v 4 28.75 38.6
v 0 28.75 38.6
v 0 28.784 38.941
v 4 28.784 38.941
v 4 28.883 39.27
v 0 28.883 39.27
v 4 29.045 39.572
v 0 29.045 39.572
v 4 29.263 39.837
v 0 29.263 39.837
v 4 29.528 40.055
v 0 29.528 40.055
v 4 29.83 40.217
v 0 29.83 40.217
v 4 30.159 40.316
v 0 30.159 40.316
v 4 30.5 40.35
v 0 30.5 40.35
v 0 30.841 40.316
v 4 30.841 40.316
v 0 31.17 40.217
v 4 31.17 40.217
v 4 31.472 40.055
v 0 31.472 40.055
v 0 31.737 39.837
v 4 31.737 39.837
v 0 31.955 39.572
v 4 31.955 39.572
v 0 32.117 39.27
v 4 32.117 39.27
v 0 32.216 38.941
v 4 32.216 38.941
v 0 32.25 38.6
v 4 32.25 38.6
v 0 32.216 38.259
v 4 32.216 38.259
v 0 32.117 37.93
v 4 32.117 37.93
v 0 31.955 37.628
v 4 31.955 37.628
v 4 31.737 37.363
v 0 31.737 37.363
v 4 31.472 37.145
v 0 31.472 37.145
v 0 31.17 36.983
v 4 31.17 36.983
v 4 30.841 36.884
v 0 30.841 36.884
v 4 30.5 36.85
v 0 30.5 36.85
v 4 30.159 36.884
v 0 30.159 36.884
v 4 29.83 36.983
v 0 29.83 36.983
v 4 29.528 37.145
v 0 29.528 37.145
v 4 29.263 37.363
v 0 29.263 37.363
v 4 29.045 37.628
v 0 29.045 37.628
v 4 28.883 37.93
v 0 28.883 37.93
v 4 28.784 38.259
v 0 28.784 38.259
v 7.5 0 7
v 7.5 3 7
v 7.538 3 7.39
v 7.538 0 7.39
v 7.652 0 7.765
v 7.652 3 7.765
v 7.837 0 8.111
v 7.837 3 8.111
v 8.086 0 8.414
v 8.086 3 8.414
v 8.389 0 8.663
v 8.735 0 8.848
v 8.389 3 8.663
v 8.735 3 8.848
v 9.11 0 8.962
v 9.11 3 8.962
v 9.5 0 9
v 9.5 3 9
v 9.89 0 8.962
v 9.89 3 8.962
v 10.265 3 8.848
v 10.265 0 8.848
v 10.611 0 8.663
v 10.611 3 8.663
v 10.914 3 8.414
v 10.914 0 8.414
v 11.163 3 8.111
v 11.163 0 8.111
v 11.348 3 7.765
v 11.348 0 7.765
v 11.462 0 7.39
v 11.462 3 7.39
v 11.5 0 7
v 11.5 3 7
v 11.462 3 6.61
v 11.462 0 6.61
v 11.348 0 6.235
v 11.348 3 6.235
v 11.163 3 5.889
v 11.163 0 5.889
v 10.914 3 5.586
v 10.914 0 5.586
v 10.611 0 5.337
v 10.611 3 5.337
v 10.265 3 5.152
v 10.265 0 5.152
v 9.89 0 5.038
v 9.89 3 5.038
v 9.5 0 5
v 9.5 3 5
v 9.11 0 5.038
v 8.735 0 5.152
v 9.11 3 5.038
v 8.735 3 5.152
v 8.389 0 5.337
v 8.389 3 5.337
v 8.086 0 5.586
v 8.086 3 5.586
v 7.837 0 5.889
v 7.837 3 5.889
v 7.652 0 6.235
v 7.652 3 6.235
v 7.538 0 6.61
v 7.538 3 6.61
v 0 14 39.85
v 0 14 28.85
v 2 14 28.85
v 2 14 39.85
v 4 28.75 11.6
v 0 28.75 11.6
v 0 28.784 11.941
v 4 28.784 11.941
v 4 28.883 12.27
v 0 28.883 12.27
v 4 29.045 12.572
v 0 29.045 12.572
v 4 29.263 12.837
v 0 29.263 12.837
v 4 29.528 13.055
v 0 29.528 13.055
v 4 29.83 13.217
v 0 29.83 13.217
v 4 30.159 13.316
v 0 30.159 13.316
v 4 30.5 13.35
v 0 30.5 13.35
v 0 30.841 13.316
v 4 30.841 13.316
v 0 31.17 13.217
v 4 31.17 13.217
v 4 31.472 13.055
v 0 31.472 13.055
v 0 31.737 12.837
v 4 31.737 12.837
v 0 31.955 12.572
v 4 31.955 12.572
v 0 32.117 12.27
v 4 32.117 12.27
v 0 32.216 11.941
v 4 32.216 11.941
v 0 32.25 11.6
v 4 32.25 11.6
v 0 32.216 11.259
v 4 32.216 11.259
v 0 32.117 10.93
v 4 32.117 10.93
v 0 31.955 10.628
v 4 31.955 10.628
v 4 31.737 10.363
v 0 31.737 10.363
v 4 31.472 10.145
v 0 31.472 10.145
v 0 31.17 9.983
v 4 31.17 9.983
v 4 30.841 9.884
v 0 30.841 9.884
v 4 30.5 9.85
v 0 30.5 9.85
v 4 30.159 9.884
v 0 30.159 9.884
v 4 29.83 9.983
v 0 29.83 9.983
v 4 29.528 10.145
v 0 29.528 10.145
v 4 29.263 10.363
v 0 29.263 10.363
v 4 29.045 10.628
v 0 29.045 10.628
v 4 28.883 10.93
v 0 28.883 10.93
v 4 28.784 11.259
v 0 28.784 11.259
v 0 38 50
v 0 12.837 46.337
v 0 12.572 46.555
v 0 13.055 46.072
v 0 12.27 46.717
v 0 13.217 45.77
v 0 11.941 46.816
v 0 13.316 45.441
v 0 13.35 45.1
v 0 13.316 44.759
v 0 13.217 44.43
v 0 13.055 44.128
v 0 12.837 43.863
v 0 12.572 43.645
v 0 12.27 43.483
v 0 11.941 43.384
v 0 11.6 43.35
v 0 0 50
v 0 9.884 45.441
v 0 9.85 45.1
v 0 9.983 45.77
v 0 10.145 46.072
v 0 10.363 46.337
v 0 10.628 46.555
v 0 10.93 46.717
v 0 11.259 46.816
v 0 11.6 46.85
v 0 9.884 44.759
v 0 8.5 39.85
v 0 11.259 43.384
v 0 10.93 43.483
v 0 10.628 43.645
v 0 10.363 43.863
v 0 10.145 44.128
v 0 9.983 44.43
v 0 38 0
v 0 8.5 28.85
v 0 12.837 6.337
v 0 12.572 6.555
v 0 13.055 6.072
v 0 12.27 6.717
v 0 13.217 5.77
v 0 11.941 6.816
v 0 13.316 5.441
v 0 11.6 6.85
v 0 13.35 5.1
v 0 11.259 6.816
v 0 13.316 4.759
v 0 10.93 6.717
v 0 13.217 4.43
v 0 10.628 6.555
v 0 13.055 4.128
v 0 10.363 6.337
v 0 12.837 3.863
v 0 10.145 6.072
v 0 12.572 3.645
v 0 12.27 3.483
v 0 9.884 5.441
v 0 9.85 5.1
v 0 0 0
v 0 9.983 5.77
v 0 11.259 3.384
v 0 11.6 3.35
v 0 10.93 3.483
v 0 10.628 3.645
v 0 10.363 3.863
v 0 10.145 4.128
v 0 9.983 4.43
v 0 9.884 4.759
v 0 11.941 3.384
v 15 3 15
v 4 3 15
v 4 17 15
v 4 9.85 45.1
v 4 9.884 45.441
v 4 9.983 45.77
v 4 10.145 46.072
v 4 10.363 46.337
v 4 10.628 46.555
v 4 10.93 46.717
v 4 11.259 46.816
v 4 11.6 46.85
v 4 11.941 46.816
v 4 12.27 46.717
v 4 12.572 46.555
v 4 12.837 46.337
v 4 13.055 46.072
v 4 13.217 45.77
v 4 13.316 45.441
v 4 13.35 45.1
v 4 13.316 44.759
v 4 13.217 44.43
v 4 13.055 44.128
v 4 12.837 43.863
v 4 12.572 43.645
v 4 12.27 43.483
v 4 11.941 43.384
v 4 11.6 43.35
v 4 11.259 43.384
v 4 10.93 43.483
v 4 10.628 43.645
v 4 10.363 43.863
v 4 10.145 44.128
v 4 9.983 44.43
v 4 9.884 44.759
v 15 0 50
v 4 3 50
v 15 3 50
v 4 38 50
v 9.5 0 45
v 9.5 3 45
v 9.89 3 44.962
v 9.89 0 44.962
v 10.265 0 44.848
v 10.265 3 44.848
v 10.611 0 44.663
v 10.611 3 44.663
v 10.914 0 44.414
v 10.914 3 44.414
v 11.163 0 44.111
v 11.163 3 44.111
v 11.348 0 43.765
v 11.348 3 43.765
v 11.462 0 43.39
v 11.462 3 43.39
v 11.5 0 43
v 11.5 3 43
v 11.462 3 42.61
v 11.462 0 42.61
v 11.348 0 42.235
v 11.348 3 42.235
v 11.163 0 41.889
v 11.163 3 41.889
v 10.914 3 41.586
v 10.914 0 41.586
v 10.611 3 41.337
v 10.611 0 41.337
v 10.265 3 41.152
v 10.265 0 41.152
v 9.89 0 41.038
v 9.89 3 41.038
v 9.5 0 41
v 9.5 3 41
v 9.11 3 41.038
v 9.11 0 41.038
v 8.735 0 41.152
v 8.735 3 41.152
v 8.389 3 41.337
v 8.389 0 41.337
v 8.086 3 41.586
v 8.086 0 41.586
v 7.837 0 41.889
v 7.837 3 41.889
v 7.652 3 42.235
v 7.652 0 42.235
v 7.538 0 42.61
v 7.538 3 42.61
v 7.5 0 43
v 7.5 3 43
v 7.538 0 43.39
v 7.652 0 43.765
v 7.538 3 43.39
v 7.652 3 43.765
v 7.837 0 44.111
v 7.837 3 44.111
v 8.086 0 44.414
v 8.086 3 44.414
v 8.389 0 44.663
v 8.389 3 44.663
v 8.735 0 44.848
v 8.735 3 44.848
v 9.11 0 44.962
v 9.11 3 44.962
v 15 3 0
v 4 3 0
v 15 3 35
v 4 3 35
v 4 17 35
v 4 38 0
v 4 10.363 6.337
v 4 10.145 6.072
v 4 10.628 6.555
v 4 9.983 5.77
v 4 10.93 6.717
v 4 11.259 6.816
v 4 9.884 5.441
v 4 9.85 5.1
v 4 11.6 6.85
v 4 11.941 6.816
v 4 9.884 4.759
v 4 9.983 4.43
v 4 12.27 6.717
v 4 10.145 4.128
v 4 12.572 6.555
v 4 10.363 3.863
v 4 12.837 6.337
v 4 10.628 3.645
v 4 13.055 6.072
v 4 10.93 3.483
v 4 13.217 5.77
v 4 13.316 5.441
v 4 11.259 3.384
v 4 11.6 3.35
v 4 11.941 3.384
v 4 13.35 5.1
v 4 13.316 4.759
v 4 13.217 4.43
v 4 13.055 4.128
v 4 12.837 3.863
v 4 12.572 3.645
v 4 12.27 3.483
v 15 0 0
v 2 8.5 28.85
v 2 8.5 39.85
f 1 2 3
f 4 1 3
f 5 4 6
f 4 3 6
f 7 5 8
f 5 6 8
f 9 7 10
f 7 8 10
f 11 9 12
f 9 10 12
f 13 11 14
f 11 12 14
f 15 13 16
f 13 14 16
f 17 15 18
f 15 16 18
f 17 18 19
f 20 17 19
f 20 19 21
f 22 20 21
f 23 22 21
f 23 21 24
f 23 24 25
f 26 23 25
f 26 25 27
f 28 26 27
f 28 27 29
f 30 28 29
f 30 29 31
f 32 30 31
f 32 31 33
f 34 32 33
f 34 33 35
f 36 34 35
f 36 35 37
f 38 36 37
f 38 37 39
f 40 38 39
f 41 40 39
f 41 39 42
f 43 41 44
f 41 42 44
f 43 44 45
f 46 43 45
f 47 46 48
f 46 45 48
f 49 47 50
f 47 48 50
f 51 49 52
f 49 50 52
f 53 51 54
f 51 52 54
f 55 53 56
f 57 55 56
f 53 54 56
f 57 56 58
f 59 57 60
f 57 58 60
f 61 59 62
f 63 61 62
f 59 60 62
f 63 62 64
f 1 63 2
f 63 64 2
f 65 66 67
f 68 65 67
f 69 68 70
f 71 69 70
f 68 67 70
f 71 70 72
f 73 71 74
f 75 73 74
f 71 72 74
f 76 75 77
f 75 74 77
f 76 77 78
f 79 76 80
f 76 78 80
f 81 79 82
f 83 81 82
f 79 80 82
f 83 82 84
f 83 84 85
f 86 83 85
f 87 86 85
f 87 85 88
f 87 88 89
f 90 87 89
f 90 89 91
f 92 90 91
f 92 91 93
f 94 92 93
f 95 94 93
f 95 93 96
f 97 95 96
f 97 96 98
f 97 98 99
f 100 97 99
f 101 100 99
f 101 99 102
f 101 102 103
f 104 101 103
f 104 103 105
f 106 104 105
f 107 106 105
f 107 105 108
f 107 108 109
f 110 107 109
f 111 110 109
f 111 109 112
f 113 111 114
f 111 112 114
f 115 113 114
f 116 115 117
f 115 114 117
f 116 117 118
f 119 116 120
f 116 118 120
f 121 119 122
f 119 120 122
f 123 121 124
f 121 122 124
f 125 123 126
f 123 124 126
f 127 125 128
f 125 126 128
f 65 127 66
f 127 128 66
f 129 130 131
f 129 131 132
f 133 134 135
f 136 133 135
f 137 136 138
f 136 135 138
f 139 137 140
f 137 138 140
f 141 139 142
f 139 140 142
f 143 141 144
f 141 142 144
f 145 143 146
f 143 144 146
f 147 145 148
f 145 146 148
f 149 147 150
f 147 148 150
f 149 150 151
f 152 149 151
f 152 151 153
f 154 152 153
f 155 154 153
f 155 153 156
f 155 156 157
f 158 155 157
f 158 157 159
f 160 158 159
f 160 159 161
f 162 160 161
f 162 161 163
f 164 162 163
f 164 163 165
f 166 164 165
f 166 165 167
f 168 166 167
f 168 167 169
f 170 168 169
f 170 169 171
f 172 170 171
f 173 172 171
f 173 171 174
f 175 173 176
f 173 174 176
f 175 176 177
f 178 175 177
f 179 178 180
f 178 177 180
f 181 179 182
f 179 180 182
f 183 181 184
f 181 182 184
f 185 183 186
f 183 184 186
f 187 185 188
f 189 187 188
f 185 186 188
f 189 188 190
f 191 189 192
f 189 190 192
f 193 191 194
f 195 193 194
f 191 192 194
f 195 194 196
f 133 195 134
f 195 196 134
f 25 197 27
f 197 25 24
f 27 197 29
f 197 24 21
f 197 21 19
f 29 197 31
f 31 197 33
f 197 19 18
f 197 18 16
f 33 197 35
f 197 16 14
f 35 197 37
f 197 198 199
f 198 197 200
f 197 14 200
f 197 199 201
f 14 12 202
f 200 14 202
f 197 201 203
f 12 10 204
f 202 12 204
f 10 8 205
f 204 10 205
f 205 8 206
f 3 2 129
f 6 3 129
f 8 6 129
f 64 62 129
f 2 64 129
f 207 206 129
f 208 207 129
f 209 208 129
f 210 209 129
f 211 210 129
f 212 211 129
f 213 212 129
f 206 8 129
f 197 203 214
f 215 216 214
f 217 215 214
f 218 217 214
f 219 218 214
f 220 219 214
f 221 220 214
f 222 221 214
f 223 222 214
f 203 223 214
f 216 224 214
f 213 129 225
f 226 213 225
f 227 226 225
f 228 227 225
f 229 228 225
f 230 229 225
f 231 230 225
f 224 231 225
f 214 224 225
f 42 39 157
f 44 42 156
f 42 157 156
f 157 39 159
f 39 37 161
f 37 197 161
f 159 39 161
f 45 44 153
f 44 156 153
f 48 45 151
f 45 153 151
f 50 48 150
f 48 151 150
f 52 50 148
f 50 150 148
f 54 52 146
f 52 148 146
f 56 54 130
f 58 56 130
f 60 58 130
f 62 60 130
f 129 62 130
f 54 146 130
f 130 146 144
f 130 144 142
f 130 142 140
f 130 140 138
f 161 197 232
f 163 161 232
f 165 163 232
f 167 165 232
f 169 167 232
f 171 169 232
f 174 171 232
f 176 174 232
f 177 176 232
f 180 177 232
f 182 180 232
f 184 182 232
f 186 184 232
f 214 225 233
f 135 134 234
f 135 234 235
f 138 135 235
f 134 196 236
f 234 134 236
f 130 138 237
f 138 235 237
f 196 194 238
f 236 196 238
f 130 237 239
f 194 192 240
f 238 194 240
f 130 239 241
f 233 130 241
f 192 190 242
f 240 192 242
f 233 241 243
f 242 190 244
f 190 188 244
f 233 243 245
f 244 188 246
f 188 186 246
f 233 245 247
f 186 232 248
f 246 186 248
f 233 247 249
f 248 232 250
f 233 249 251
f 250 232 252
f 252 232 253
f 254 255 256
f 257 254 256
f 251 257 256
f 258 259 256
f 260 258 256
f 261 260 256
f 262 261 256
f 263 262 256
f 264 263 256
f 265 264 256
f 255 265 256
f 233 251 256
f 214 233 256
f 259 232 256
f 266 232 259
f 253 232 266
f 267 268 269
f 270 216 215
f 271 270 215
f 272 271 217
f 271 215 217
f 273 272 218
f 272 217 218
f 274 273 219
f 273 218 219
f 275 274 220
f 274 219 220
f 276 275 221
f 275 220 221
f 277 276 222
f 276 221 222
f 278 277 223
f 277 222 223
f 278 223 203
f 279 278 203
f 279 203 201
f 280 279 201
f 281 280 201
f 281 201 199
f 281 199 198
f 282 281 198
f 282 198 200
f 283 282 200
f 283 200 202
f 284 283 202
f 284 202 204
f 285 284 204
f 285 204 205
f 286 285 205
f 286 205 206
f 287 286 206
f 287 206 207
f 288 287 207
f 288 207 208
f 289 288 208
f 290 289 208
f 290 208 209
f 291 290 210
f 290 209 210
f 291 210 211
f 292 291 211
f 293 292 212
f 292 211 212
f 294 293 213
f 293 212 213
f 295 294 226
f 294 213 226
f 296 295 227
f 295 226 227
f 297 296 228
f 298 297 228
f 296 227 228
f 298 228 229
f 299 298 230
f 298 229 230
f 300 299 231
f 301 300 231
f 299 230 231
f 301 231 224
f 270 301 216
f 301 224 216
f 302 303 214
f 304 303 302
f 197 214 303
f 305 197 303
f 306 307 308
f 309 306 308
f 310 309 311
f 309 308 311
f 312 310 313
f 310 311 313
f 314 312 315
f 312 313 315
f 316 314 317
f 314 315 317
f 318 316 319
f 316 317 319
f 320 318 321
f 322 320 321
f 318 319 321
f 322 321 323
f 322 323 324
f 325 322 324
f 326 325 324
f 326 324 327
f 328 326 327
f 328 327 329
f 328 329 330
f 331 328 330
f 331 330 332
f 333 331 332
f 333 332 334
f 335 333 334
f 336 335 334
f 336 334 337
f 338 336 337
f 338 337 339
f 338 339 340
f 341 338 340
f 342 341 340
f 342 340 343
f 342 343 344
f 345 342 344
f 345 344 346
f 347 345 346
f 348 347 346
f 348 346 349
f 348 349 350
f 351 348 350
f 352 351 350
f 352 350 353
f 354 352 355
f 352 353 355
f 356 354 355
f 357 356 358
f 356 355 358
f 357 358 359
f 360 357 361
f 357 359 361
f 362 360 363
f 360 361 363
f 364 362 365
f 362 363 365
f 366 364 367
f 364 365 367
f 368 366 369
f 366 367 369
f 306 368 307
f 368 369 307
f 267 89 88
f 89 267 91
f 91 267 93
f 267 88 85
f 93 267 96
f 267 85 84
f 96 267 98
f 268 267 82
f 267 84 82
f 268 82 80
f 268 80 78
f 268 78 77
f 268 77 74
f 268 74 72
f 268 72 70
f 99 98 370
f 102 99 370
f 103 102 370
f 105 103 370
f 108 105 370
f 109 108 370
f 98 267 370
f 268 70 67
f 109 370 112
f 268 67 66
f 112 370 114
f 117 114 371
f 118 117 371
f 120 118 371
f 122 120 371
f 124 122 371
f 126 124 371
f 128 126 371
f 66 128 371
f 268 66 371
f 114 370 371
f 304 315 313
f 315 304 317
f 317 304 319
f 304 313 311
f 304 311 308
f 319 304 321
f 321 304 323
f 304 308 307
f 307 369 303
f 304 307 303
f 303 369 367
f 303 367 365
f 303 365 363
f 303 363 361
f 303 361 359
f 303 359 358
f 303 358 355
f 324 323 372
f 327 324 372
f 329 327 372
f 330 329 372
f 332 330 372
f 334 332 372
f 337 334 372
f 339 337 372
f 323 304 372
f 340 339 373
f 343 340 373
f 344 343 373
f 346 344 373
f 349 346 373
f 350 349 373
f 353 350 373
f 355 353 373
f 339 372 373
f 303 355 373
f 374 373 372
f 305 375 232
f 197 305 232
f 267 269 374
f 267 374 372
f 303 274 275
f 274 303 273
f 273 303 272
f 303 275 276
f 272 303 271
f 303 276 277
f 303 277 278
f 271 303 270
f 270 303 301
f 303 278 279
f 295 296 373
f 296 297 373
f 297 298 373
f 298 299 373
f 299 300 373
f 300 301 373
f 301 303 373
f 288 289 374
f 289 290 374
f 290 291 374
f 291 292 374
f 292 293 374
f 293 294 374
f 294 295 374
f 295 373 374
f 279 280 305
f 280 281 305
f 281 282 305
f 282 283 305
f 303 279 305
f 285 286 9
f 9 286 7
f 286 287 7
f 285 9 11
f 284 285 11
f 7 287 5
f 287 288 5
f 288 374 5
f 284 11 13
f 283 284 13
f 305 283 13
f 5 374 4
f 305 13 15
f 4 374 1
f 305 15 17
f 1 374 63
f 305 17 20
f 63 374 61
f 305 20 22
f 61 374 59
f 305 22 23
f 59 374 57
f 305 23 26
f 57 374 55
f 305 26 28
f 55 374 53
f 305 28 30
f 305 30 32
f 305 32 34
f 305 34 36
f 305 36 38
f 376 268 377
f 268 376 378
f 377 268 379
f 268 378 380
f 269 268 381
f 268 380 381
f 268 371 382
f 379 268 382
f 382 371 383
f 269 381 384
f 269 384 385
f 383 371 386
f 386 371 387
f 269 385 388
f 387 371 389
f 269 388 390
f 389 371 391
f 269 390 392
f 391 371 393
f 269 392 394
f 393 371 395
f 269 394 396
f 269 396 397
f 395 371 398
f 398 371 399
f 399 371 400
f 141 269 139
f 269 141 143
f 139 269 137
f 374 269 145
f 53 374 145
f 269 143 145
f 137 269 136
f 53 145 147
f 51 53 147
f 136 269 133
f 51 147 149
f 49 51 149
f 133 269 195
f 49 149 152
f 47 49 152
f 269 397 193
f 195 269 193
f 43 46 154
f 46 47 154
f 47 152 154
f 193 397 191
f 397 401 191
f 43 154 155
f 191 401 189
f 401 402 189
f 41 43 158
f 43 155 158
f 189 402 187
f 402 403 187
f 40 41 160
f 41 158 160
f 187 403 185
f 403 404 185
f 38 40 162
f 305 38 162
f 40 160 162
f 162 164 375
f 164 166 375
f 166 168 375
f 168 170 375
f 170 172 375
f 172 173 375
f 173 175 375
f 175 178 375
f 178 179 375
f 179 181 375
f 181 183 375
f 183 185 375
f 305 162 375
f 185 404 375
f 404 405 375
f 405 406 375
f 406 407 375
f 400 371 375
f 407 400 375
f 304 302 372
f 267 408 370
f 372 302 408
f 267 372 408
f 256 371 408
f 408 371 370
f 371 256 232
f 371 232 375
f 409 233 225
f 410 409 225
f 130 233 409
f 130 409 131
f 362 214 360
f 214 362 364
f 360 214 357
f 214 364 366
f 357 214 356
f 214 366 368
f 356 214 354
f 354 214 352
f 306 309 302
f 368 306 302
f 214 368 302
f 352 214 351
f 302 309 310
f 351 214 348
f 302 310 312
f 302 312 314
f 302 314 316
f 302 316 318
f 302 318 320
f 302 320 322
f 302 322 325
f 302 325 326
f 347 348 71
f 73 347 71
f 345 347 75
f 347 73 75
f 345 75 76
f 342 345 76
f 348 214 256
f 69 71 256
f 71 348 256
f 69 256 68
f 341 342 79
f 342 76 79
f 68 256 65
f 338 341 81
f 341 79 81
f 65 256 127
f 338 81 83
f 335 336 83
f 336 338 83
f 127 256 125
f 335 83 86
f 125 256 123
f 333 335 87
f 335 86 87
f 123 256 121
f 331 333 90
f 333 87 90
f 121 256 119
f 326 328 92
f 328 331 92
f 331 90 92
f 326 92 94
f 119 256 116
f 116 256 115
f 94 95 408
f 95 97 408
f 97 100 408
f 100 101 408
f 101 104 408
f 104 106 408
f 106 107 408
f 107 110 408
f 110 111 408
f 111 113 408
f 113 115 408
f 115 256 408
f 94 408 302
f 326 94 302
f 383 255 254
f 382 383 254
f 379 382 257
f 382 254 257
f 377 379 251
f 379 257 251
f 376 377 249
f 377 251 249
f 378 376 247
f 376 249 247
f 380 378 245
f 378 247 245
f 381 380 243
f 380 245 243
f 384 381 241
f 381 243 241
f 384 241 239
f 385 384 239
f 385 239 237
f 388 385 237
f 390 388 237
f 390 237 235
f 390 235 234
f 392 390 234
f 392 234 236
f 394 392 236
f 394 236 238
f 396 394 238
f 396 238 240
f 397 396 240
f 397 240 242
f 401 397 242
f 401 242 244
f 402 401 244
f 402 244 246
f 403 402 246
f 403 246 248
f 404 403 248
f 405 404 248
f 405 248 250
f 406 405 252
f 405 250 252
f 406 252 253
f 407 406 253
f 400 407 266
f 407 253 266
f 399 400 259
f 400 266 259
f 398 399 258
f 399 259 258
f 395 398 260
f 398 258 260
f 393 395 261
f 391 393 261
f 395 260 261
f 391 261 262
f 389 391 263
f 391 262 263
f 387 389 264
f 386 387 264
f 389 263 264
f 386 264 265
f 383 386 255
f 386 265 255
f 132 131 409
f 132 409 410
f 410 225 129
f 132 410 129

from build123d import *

# Parameters (mm, degrees)
BOSS_EXTRUDE1_DEPTH = 50
SKETCH2_W           = 11
SKETCH2_H           = 20
BOSS_EXTRUDE2_DEPTH = 30
CUT_EXTRUDE1_DEPTH  = 65.567793829
SKETCH4_R           = 1.75
CUT_EXTRUDE2_DEPTH  = 30
SKETCH5_R           = 2
CUT_EXTRUDE3_DEPTH  = 30
SKETCH6_W           = 11
SKETCH6_H           = 5.5
CUT_EXTRUDE4_DEPTH  = 2


with BuildPart() as part:
    # Sketch1 → Boss-Extrude1 (new body)
    with BuildSketch(Plane.XY):
        Polygon((0, 38), (0, 0), (15, 0), (15, 3), (4, 3), (4, 38), align=None)
    extrude(amount=BOSS_EXTRUDE1_DEPTH)

    # Sketch2 → Boss-Extrude2 (add)
    with BuildSketch(Plane(origin=(0, 3, 0), x_dir=(1, 0, 0), z_dir=(0, 1, 0))):
        with Locations((9.5, -25)):
            Rectangle(SKETCH2_W, SKETCH2_H)
    extrude(amount=BOSS_EXTRUDE2_DEPTH)

    # Sketch3 → Cut-Extrude1 (cut, through all)
    with BuildSketch(Plane.XY.offset(50)):
        Polygon((4, 33), (4, 17), (15, 3), (15, 33), align=None)
    extrude(amount=-CUT_EXTRUDE1_DEPTH, mode=Mode.SUBTRACT)

    # Sketch4 → Cut-Extrude2 (cut)
    with BuildSketch(Plane.ZY):
        with Locations(Location((5.1, 11.6, 0), (0, 0, 270))):
            Circle(SKETCH4_R)
        with Locations(Location((11.6, 30.5, 0), (0, 0, 270))):
            Circle(SKETCH4_R)
        with Locations(Location((45.1, 11.6, 0), (0, 0, 270))):
            Circle(SKETCH4_R)
        with Locations(Location((38.6, 30.5, 0), (0, 0, 270))):
            Circle(SKETCH4_R)
    extrude(amount=-CUT_EXTRUDE2_DEPTH, mode=Mode.SUBTRACT)

    # Sketch5 → Cut-Extrude3 (cut)
    with BuildSketch(Plane(origin=(0, 3, 0), x_dir=(1, 0, 0), z_dir=(0, 1, 0))):
        with Locations(Location((9.5, -43, 0), (0, 0, 270))):
            Circle(SKETCH5_R)
        with Locations(Location((9.5, -7, 0), (0, 0, 180))):
            Circle(SKETCH5_R)
    extrude(amount=-CUT_EXTRUDE3_DEPTH, mode=Mode.SUBTRACT)

    # Sketch6 → Cut-Extrude4 (cut)
    with BuildSketch(Plane.ZY):
        with Locations((34.35, 11.25)):
            Rectangle(SKETCH6_W, SKETCH6_H)
    extrude(amount=-CUT_EXTRUDE4_DEPTH, mode=Mode.SUBTRACT)


solid = part.part
